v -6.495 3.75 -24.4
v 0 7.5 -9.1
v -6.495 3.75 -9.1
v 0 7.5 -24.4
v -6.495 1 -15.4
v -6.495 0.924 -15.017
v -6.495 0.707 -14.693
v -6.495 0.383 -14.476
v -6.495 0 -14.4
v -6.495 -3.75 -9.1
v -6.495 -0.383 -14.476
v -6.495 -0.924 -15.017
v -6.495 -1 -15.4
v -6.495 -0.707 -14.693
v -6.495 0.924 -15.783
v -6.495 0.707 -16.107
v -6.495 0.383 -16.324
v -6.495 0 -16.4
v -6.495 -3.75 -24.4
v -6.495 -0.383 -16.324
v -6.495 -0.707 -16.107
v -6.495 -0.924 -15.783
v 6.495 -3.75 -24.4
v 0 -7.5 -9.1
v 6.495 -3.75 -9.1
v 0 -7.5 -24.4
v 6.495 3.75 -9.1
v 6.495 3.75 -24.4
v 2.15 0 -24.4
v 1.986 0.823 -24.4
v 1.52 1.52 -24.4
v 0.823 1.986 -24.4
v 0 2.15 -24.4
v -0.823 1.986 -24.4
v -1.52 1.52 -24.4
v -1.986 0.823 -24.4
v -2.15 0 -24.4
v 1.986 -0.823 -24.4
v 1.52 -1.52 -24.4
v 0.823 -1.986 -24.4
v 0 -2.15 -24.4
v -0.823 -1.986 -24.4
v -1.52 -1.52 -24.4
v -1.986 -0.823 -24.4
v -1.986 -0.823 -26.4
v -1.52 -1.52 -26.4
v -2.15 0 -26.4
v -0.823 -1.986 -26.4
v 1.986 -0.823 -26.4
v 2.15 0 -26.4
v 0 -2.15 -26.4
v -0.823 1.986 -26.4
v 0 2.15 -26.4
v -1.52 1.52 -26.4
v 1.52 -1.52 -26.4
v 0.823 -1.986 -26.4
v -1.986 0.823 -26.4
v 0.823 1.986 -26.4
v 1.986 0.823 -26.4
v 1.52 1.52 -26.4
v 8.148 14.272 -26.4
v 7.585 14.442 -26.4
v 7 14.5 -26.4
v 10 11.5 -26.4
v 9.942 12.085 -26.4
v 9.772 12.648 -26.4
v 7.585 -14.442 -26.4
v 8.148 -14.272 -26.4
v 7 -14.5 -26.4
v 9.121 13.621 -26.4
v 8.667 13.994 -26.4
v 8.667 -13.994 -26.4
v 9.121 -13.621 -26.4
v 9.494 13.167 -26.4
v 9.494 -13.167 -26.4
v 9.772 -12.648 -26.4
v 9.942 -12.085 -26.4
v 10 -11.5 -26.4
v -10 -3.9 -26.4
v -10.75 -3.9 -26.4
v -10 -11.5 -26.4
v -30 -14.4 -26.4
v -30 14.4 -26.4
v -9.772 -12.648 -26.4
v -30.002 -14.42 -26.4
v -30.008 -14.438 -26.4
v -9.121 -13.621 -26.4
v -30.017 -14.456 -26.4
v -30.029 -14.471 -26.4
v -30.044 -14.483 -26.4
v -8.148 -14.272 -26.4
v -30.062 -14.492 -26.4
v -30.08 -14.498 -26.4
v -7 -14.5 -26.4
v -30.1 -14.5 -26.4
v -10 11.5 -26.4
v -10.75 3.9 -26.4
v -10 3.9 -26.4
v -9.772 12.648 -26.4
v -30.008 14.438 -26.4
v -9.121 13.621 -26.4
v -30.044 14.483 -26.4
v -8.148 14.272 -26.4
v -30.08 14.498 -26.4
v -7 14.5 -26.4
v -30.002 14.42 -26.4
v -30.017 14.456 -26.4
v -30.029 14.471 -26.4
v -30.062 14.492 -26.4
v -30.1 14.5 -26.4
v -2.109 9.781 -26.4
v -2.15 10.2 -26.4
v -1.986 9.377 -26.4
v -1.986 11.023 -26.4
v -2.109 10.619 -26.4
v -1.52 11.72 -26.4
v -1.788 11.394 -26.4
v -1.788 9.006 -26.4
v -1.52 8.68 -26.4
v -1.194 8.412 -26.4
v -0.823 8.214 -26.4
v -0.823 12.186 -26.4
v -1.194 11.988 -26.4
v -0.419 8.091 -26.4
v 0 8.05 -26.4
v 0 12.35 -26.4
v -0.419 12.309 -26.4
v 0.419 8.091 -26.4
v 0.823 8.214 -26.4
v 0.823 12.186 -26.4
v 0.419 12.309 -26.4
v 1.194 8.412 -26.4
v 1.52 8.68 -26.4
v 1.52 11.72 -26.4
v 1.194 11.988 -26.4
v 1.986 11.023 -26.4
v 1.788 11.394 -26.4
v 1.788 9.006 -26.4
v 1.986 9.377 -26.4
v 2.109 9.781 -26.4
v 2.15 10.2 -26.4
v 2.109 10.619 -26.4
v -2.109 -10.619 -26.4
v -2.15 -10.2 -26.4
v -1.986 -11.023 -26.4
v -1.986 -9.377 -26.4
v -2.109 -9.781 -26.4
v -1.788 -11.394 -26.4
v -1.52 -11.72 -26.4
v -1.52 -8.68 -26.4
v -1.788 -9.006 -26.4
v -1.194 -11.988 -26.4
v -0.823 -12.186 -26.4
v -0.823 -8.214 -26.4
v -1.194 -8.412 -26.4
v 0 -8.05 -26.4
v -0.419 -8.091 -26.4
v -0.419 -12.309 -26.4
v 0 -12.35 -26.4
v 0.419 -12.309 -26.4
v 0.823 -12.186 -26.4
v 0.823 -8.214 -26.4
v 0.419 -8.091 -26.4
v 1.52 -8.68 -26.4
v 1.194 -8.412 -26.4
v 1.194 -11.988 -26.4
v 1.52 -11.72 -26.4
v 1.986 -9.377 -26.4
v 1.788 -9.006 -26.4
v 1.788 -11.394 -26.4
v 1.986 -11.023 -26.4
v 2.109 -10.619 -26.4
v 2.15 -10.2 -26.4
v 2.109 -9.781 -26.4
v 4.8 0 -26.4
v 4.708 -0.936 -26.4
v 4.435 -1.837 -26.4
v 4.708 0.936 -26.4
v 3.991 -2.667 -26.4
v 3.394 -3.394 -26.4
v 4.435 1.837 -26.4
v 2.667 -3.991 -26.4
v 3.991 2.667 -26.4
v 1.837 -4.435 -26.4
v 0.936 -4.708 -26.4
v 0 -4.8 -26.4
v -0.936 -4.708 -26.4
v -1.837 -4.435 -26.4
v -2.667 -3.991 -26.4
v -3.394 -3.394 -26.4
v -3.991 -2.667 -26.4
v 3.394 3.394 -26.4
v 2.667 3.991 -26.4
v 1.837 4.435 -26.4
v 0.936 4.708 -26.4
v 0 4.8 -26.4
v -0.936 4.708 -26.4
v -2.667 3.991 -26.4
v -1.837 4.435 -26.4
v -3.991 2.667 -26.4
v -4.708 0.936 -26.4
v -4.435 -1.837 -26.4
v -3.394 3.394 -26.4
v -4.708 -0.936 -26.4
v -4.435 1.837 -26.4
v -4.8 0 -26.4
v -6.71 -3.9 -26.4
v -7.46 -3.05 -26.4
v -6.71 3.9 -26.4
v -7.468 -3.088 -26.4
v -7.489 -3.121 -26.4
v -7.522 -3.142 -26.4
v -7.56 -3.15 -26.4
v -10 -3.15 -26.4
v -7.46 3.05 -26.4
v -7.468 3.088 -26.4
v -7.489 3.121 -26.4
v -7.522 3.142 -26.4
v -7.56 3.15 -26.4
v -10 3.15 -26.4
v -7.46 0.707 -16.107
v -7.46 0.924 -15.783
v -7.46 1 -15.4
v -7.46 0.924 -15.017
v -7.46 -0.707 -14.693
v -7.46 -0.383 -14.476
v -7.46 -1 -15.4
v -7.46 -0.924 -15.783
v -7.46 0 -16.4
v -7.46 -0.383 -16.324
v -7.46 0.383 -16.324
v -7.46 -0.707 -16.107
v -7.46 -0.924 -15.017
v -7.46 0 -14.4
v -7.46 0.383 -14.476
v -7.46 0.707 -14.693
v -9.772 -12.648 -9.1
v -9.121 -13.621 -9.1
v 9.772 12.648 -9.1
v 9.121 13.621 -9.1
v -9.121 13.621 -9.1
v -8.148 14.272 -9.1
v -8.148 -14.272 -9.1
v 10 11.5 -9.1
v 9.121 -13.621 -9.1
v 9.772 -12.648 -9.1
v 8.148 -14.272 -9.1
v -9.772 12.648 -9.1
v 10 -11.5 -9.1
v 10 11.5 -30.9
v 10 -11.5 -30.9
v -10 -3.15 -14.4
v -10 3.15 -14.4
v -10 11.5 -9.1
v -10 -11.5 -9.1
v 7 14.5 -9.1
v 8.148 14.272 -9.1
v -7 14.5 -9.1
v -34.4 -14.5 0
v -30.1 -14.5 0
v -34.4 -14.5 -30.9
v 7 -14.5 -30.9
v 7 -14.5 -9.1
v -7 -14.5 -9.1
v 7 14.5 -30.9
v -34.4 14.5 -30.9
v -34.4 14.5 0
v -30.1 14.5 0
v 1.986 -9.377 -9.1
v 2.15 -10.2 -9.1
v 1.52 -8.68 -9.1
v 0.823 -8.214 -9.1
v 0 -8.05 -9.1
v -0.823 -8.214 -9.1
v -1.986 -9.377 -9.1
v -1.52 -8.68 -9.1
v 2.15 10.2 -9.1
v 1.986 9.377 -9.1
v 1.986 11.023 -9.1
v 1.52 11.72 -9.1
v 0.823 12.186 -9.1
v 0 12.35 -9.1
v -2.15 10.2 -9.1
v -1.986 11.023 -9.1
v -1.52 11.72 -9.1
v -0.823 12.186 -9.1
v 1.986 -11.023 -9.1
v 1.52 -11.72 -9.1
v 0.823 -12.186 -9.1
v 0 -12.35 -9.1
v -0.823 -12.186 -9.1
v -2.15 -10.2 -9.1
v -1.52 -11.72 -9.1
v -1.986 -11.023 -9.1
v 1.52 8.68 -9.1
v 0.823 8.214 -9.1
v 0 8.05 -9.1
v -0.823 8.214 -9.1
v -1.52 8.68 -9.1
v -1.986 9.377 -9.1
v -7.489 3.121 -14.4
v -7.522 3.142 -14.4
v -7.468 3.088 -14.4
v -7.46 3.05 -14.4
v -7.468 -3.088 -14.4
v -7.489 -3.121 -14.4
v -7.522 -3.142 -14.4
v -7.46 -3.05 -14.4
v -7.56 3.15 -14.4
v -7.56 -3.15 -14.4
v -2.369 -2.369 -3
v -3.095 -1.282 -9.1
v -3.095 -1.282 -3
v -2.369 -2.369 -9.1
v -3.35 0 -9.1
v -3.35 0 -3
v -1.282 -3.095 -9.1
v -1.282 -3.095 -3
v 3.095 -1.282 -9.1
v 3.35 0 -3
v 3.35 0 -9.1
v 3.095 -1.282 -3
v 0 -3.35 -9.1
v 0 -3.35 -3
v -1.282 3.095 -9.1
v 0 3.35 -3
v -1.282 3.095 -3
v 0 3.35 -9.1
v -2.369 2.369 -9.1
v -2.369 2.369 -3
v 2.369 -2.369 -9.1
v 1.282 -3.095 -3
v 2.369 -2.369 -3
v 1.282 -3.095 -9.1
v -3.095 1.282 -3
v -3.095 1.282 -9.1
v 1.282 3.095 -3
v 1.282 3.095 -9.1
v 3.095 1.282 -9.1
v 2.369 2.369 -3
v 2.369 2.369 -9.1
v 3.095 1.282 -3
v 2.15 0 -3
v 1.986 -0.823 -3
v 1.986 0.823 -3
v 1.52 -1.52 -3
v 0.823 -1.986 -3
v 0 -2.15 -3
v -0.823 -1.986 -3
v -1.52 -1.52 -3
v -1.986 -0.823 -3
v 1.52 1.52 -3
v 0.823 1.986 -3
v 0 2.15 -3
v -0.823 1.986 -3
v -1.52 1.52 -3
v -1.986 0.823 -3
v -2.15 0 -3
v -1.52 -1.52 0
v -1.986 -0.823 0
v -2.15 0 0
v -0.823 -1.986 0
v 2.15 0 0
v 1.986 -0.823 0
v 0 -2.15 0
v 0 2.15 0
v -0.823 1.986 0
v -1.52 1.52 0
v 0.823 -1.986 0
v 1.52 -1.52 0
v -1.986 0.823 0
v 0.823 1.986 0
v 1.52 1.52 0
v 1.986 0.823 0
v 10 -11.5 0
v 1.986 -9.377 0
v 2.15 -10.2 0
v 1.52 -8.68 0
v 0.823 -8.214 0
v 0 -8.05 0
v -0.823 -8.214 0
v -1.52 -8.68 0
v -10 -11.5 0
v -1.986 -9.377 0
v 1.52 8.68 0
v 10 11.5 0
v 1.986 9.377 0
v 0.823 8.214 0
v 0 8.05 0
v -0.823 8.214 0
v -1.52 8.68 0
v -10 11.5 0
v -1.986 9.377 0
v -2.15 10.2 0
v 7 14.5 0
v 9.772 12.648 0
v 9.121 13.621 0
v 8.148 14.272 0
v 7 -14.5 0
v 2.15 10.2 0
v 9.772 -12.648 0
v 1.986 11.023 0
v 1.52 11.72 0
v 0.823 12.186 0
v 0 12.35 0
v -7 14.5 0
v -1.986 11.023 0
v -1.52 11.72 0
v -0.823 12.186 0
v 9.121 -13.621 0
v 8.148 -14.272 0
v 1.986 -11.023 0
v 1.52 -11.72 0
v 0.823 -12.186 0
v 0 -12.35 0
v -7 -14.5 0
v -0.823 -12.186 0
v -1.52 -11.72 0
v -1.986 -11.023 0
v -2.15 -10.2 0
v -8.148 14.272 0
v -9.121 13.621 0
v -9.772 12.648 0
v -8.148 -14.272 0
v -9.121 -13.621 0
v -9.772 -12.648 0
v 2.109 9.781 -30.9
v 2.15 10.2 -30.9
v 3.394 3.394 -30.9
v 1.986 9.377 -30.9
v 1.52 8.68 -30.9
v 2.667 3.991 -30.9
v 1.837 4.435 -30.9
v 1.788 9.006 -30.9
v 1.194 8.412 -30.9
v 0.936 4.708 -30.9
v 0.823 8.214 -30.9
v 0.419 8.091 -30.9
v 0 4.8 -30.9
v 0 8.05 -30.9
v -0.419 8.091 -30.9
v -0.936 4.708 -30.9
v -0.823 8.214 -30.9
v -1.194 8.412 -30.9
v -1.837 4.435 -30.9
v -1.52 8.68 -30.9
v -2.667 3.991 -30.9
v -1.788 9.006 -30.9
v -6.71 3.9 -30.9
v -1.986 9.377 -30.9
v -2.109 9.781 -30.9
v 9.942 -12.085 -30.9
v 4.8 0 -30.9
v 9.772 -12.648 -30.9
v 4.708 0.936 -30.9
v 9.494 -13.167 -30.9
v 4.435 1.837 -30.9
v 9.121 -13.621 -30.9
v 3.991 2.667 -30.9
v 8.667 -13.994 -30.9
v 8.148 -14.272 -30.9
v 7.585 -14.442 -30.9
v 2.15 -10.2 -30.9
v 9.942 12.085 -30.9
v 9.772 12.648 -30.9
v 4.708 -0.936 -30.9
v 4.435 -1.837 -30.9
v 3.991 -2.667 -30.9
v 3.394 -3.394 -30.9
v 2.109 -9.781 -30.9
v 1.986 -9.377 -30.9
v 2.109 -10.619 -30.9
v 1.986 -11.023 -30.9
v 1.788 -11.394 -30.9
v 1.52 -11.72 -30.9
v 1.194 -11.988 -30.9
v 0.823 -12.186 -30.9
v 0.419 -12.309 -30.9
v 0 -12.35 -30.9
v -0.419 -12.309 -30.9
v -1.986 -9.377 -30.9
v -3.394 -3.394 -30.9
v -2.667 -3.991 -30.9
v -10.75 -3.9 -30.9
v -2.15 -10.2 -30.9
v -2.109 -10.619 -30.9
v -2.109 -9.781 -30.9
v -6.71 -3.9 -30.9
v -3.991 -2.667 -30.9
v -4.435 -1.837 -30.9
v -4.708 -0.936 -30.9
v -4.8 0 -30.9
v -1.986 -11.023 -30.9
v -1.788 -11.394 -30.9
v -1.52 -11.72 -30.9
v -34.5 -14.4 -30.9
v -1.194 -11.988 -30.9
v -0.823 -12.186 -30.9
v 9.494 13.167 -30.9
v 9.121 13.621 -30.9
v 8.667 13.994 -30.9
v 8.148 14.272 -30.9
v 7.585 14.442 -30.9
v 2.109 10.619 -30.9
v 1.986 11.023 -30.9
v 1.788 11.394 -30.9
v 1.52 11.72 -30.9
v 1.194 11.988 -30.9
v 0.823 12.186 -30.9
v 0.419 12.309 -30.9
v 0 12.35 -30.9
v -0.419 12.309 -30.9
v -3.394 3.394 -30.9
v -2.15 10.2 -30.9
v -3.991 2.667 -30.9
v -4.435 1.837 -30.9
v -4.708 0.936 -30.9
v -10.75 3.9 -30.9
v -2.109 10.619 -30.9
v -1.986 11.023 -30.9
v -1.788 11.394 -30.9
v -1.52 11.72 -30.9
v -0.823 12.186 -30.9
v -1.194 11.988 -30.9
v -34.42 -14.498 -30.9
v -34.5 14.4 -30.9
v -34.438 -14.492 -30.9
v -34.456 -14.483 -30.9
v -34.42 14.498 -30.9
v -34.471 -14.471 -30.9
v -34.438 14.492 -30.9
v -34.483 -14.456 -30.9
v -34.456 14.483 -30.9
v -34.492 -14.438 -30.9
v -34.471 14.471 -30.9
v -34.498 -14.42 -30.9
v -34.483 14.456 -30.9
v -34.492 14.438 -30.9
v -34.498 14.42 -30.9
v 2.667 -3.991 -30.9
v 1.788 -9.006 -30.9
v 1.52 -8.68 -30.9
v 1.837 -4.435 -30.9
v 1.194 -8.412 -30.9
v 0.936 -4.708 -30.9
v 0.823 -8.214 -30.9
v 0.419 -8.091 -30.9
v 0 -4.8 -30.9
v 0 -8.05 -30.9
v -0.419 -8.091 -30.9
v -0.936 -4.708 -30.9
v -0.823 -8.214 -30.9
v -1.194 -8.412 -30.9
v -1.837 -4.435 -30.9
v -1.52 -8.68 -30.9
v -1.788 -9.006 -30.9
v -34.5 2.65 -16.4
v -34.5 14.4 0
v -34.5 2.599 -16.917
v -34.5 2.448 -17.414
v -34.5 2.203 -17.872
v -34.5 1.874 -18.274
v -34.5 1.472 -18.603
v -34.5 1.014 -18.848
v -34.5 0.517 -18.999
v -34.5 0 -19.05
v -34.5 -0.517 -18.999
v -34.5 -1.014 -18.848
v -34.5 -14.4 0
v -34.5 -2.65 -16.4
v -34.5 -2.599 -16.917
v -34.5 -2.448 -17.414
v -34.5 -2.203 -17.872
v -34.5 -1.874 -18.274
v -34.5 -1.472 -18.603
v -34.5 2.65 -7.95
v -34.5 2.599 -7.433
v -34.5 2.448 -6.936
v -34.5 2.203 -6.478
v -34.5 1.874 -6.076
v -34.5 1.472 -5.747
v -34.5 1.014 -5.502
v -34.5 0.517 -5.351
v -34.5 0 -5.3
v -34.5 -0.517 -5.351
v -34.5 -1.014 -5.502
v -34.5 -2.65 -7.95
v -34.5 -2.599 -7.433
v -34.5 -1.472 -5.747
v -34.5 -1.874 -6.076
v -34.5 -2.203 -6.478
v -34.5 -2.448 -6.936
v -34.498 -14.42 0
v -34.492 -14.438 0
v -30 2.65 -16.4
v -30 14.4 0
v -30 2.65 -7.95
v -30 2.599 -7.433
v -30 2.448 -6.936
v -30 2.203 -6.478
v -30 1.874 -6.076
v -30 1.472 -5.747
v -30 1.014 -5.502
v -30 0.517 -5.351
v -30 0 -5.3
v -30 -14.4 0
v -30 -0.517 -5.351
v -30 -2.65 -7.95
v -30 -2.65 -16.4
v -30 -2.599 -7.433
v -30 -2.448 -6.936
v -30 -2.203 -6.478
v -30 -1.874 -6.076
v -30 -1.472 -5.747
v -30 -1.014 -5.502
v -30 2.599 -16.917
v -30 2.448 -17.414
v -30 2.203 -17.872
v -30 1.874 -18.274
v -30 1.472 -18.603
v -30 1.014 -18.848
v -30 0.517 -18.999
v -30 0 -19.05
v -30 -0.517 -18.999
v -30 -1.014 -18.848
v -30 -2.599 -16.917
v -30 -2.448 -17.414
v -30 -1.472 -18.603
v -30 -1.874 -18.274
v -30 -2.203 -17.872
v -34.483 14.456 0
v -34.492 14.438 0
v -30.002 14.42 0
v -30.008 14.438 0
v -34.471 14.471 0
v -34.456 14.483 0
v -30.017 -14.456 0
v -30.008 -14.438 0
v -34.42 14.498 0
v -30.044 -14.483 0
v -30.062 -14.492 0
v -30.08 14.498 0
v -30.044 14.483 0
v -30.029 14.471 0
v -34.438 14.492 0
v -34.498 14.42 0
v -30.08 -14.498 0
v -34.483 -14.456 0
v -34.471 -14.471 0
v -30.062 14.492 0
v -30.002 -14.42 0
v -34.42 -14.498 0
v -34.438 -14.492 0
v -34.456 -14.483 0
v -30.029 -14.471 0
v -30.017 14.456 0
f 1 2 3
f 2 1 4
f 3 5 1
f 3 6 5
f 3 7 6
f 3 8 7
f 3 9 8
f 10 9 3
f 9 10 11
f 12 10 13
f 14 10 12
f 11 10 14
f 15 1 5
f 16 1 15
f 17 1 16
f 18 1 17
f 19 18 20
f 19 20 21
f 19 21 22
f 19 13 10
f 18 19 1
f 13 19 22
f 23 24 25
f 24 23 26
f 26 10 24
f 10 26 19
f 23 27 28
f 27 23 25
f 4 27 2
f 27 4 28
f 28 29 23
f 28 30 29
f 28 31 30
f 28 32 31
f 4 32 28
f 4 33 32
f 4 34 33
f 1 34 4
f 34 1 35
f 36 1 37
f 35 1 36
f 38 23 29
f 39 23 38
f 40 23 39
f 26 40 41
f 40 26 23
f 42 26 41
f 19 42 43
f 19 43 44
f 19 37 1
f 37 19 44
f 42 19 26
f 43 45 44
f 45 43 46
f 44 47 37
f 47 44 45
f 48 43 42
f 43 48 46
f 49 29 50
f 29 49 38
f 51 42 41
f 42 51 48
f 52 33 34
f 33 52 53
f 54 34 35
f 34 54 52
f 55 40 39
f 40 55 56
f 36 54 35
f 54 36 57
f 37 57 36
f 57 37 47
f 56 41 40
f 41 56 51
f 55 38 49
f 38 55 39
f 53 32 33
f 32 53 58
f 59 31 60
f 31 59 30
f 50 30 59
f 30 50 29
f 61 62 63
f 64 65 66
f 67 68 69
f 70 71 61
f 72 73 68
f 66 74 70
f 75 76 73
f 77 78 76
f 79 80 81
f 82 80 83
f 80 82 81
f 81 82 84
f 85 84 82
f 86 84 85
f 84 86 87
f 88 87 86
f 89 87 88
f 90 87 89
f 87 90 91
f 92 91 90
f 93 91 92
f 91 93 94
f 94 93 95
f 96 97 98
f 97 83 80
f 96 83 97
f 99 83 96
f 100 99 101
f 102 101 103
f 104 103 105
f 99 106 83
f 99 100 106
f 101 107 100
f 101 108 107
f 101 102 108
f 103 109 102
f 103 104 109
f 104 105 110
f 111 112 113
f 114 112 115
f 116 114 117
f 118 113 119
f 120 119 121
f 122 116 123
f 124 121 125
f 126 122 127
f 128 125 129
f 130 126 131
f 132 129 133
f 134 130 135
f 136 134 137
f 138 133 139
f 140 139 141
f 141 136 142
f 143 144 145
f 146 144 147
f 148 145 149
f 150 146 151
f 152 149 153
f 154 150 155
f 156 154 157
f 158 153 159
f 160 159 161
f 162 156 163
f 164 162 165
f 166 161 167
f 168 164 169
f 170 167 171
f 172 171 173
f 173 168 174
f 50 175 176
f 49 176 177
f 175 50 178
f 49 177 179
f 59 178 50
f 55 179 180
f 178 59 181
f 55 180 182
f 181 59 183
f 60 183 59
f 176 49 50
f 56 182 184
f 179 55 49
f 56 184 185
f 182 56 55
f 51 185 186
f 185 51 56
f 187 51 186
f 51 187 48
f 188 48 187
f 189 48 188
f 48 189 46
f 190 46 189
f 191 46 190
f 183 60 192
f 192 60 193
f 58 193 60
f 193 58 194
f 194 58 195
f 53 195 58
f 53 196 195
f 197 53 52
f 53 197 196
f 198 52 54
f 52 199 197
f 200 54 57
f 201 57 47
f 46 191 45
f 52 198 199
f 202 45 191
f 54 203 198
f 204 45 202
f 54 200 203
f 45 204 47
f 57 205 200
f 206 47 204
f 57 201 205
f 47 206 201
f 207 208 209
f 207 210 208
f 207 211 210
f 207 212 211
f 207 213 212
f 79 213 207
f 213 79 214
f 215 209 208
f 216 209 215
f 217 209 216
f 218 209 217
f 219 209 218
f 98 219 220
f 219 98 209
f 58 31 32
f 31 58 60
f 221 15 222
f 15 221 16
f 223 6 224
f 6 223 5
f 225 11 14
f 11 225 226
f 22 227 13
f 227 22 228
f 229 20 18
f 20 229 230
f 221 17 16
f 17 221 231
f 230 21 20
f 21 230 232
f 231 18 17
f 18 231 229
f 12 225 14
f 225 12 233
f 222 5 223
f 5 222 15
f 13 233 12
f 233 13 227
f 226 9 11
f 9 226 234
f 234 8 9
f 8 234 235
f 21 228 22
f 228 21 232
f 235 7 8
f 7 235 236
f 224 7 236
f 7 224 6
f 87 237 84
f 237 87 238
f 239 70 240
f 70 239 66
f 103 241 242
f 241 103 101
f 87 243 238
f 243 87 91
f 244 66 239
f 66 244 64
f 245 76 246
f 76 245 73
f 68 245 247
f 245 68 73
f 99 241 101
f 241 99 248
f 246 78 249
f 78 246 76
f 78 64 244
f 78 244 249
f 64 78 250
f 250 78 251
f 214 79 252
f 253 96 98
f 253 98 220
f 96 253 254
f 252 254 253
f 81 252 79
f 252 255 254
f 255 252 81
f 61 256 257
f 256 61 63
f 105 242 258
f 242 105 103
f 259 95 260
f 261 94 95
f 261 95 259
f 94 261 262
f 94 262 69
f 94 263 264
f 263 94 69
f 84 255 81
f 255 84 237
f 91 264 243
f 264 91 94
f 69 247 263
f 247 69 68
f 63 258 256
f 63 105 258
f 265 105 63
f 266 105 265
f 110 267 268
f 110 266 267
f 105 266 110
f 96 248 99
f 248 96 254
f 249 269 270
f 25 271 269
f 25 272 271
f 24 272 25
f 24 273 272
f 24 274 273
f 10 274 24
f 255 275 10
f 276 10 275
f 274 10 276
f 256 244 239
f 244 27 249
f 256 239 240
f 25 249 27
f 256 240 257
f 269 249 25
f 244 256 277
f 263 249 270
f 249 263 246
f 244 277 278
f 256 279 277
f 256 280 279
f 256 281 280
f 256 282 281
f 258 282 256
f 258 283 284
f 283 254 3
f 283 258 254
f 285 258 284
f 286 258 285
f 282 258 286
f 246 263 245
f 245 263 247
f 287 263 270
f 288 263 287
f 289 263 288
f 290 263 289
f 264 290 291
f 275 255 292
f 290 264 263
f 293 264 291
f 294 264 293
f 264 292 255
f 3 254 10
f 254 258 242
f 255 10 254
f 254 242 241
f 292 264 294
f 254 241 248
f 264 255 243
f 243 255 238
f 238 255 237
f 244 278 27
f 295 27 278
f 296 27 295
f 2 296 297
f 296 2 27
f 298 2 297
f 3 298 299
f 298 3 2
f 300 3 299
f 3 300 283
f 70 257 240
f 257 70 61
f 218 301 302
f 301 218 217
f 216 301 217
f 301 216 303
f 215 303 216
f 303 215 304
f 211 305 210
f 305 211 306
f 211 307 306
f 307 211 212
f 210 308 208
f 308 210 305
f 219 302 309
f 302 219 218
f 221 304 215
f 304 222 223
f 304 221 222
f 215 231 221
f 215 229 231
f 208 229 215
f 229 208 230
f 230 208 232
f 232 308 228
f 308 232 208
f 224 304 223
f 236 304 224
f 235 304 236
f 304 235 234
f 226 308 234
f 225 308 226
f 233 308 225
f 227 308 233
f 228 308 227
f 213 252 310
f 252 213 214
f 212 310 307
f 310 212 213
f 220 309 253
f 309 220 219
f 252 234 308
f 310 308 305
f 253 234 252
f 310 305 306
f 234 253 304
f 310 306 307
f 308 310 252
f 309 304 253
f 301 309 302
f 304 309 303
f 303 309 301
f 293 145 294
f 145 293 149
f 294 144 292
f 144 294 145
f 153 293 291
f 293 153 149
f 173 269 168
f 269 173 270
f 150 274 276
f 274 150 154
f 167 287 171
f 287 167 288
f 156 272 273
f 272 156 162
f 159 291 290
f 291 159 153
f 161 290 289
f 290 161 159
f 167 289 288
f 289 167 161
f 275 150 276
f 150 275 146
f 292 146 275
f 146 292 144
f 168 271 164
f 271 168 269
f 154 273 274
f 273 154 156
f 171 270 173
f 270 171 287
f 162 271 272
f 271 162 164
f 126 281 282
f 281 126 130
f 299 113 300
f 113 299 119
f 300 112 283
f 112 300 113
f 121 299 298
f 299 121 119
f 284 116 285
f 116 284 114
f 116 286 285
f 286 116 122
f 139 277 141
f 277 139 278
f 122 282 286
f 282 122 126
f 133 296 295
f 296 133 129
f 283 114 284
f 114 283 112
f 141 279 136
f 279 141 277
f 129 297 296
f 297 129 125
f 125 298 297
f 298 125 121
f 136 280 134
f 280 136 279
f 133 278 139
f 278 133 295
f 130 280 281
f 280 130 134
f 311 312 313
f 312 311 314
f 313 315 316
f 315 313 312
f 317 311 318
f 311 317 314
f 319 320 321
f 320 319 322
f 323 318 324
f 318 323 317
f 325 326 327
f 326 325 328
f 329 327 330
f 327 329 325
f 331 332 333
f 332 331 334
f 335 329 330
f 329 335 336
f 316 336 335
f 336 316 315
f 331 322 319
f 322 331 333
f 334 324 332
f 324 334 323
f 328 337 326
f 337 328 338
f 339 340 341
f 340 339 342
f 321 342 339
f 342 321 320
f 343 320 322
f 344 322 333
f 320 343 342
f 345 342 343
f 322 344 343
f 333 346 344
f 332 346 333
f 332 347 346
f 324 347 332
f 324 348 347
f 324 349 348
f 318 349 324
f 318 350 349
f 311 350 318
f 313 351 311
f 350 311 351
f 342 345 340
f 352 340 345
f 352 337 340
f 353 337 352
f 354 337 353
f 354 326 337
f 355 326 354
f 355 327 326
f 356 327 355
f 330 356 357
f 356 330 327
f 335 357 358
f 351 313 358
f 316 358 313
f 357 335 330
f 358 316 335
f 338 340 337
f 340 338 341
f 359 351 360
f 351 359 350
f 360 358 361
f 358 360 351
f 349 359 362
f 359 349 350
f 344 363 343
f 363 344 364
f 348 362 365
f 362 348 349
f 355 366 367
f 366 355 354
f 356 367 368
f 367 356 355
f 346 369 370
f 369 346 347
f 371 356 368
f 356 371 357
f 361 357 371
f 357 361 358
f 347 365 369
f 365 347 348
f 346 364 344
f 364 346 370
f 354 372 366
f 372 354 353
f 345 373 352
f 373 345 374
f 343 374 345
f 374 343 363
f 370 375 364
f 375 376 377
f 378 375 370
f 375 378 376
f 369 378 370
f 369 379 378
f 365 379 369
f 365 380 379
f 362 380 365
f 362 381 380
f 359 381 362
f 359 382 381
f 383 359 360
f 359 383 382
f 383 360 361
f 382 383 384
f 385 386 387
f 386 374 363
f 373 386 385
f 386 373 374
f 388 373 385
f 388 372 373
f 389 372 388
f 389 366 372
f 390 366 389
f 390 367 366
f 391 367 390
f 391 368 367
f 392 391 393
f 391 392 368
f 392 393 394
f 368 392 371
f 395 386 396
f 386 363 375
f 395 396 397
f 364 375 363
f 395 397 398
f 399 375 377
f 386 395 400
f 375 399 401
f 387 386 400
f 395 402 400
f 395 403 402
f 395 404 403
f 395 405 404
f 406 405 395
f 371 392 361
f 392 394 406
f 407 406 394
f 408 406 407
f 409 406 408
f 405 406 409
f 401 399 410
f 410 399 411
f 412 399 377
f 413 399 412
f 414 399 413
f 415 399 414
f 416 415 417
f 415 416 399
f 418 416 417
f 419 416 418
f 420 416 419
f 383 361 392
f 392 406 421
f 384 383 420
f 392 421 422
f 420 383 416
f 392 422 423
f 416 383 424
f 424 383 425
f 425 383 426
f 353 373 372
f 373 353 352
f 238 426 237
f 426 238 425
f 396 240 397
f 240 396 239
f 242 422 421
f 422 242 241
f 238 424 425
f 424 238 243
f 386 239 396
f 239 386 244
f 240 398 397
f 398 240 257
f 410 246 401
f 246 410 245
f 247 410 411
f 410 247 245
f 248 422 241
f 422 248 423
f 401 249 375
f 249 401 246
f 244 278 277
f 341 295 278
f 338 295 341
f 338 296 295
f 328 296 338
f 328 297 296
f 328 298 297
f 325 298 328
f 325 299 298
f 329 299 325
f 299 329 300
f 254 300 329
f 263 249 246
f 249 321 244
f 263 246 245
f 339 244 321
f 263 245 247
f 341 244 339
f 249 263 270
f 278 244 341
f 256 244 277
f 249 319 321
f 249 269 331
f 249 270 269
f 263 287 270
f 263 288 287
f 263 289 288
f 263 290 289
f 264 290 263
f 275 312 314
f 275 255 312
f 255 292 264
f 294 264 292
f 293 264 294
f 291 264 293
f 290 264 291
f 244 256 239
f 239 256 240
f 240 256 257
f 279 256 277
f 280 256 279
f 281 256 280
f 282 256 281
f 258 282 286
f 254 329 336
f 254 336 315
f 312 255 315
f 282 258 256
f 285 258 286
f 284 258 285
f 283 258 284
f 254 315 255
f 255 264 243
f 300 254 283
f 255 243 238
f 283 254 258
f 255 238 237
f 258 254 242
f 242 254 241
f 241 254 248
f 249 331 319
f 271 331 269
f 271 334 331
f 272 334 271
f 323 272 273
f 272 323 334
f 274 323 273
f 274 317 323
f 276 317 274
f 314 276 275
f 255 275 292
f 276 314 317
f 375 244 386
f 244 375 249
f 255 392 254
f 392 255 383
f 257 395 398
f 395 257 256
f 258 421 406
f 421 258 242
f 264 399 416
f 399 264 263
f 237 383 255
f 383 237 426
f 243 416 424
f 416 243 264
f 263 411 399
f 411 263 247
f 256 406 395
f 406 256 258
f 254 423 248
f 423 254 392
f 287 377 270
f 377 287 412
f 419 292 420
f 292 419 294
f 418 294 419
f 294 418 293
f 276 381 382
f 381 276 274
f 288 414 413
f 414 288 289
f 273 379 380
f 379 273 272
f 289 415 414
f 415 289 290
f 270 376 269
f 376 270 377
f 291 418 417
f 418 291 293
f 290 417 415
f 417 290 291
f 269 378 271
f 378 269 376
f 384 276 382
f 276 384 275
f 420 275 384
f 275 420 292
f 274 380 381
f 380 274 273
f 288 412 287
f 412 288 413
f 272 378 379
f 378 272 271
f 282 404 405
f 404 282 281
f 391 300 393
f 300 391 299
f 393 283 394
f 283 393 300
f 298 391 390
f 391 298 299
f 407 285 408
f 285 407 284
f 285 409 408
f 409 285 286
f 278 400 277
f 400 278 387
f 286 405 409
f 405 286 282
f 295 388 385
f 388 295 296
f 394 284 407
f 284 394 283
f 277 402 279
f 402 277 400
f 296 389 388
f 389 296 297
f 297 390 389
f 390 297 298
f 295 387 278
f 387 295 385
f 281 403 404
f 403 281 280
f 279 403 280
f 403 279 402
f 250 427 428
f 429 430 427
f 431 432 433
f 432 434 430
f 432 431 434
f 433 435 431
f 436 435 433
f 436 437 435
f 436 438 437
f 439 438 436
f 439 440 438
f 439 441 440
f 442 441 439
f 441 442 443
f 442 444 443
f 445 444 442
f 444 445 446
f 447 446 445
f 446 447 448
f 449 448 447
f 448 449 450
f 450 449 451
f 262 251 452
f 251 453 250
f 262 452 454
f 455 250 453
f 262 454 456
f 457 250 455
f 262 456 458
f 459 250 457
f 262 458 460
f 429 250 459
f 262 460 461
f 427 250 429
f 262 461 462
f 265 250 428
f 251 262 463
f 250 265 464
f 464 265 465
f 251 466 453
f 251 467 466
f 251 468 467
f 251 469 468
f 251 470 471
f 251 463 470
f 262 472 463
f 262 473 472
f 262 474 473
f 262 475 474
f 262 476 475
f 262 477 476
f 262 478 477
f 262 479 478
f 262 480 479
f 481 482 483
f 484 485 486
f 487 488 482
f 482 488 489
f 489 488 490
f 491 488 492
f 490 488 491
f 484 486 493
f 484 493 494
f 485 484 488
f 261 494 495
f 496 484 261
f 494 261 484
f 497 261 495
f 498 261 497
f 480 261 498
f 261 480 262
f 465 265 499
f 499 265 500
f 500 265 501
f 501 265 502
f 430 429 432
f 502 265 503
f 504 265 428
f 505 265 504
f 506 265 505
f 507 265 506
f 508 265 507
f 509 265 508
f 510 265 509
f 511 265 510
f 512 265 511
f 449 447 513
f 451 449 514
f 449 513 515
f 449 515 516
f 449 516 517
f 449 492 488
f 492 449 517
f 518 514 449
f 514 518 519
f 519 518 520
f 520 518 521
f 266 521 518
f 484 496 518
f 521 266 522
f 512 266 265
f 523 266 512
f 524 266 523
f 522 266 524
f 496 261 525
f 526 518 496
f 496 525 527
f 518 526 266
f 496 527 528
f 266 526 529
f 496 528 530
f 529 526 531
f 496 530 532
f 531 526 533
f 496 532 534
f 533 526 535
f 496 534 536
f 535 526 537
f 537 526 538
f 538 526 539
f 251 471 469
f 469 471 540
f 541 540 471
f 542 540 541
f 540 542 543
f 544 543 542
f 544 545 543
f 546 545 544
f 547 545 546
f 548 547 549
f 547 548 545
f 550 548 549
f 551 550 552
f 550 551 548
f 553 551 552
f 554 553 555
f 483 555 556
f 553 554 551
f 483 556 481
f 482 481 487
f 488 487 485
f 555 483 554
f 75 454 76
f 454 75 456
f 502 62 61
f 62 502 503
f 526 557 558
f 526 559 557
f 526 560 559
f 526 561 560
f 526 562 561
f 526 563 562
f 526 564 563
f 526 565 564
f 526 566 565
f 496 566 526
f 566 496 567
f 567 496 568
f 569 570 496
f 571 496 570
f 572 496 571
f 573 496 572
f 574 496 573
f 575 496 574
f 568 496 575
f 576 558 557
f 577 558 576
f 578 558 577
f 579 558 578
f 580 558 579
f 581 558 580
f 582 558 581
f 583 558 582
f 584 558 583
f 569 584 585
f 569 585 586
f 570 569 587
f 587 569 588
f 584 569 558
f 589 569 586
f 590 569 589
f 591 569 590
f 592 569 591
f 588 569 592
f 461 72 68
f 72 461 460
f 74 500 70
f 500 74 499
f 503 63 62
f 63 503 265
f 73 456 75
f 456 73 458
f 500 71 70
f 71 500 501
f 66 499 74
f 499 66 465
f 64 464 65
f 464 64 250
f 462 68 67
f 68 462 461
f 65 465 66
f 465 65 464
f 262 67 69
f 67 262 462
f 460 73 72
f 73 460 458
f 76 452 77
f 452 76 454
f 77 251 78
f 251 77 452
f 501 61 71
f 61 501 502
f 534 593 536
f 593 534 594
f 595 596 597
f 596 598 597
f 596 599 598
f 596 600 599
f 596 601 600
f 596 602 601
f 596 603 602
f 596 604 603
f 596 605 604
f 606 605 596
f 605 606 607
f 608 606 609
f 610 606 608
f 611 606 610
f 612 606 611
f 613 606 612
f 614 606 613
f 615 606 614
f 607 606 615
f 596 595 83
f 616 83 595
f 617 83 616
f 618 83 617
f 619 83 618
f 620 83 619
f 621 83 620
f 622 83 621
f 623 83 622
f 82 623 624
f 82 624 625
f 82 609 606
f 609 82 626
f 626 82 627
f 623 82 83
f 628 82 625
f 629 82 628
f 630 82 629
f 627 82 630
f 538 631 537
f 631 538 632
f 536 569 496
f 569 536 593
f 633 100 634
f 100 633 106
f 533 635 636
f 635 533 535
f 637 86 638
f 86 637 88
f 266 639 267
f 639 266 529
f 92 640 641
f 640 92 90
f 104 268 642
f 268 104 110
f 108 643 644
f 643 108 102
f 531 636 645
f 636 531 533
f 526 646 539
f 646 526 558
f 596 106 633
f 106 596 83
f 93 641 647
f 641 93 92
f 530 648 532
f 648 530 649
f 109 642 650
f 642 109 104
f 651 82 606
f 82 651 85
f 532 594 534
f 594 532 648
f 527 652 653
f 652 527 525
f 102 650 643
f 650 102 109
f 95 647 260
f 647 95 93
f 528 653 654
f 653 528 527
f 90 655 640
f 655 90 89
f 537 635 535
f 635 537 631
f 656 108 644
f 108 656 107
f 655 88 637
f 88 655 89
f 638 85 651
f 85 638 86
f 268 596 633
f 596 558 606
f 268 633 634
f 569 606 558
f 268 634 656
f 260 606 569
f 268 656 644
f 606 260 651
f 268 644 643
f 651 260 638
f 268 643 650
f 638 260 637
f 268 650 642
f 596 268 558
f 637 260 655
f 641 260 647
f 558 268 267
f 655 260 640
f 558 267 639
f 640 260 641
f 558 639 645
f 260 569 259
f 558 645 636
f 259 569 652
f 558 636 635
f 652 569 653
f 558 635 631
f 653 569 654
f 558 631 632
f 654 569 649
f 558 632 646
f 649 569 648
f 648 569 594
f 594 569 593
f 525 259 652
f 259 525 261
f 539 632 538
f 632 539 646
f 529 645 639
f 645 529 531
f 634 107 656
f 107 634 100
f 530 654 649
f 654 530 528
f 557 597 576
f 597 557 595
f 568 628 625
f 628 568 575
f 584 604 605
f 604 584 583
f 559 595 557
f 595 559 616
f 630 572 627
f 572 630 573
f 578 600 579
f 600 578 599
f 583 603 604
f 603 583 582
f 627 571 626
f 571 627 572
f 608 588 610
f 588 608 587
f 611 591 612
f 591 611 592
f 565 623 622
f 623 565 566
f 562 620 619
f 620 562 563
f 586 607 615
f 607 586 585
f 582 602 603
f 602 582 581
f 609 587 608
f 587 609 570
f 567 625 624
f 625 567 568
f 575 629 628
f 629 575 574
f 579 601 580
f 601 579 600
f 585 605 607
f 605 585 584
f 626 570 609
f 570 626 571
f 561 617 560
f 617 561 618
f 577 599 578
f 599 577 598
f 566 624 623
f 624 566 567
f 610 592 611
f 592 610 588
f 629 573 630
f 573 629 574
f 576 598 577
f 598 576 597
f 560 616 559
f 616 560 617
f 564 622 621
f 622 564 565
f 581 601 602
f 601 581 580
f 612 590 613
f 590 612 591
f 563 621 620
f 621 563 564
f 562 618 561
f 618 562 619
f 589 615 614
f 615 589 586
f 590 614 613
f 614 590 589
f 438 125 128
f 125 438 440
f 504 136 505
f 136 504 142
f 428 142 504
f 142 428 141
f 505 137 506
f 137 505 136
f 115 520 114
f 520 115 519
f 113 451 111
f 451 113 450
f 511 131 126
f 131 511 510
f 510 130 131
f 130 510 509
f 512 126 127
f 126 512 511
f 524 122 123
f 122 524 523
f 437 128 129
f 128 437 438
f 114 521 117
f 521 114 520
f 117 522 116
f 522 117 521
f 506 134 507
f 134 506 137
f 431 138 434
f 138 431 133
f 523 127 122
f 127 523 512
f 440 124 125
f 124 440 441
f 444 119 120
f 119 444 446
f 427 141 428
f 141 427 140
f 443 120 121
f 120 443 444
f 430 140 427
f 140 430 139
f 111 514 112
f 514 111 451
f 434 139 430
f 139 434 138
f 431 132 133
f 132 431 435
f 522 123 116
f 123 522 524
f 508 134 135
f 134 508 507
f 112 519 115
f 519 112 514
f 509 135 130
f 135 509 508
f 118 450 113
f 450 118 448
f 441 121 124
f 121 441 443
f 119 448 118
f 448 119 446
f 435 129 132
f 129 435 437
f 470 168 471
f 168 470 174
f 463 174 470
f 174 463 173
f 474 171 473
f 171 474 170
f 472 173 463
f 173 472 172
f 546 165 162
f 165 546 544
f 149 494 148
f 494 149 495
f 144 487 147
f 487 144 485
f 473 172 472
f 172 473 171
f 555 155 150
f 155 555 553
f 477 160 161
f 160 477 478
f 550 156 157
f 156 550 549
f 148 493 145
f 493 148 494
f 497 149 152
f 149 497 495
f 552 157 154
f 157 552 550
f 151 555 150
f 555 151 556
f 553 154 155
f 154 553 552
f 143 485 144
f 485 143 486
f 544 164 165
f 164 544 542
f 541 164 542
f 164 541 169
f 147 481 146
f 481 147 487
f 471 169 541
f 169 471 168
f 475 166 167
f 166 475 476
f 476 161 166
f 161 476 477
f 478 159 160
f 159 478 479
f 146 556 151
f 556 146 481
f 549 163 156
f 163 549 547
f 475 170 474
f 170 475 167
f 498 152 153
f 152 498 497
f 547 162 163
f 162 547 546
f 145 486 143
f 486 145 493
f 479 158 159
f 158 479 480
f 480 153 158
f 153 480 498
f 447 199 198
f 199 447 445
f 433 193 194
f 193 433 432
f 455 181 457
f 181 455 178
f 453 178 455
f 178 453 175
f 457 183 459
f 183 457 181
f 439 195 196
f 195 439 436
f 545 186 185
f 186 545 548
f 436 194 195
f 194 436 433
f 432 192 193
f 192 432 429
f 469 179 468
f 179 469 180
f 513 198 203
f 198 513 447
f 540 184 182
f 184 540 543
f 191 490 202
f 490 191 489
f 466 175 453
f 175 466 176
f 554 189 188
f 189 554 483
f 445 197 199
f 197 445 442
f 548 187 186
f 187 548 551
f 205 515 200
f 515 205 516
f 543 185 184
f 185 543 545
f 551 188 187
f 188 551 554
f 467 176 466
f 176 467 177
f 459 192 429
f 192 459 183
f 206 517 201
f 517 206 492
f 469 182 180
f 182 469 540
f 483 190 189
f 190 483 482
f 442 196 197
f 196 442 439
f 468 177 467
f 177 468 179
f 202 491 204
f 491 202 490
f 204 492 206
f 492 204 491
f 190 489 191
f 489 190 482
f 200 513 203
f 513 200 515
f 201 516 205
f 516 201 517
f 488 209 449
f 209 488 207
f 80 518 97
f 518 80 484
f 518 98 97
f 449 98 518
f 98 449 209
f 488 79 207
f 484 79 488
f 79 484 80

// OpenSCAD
// file: parameter.scad
//-------Parameter GHarp----------------------------------------------------

strScale=650;
strDia=3;
strPosX=20;
strPosY=-20;
slotXY=20;
nStr=3;

nema17_height=40;
nema17_width=42;
nema17_shftDia=5;
nema17_shftLen=28;
nema17_holeDist=31;
Nema17_gearDia=23;

tuner_bDi=7.8;
tuner_bDo=22.2;
tuner_bZ=10;
tuner_rThick=5;
//tuner_tDia=strPosX*2; (big)
tuner_tDia=strPosX*2-10;
tuner_leverZ=10;
tuner_zPos=225;
tuner_strDia=strDia[0];
tuner_leverY=35;

//----------Kickup----------------------------------------------------

kickup_baseX=17;
kickup_baseY=13;
kickup_zAdjDia=3.3;
kickup_zAdjL=10;
kickup_zAdjDist=10.5;
kickup_zAdjOff=4;
//------------------------------------------------------------------------

slide_cpDst=1.5;
slide_rackPosX=(55-12.5);

m3Dia=3.3;
m3NutD=6.6;
m4Dia=4.3;
m4NutD=8.3;
m4NutZ=5;
m5Dia=5.3;
m5HeadD=9.6;

edgeR=3;

gearXPos=57;
gearYPos=0;
gearZPos=360;

rackScrD=20;
rack_X=13;
rack_Y=15.5;
rack_extOffX=0;

bearGearD=25;
mntGrD=20.5; //mount gear distance

mnt_pcbA_X=157;
mnt_pcbA_Y=101;

//---------End Parameter GHarp-----------------------------------------------


////-------Parameter Bass----------------------------------------------------

//strScale=650;
//strDia=4;
//strPosX=20;
//strPosY=-20;
//slotXY=20;
//
//nema17_height=40;
//nema17_width=42;
//nema17_shftDia=5;
//nema17_shftLen=28;
//nema17_holeDist=31;
//Nema17_gearDia=23;
//
//tuner_bDi=7.8;
//tuner_bDo=22.2;
//tuner_bZ=10;
//tuner_rThick=5;
////tuner_tDia=strPosX*2; (big)
//tuner_tDia=strPosX*2-10;
//tuner_leverZ=10;
//tuner_zPos=225;
//tuner_strDia=strDia[0];
//tuner_leverY=35;
//
////----------Kickup----------------------------------------------------
//
//
//kickup_baseX=22;
//kickup_baseY=15;
//kickup_zAdjDia=3.3;
//kickup_zAdjL=10;
//kickup_zAdjDist=13;
//kickup_zAdjOff=4;
//
//
//slide_cpDst=1.5;
//slide_rackPosX=(55-12.5);
//
//m3NutD=6.6;
//m4Dia=4.3;
//m4NutD=8.3;
//m5Dia=5.3;
//
//edgeR=3;
//
//gearXPos=57;
//gearYPos=0;
//gearZPos=360;
//
//rackScrD=20;
//rack_X=13;
//rack_Y=15.5;
//rack_extOffX=0;
//
//bearGearD=25;
//mntGrD=20.5; //mount gear distance
////
//////---------End Bass-----------------------------------------------
// main file
include <parameter.scad>
strSpanB=10;
bodySlotX=100;

kickup(2);

module kickup(orient){
$fn=32;
strings=2;
spacing=strSpanB;//52;
echo (spacing);
diameter=15;
wall=2;
coilZ=15;
bottomZ=2;
t=0.3;
ySpacing=12;

bX = slotXY;
bY=ySpacing+diameter+wall*1;
bZ=coilZ+bottomZ+t;

tX = bX;
tY=bY;
hub=3;
magZ=3.1;
tbottomZ=3;
tZ=hub+magZ+tbottomZ;
tDia=6.7;//6.5;
screwTdia=4.3;

conMntX=2.54;
conMntY=6.3;
conMntZ=12;
conWt=1.5;

screwMdia=4.3;
screwAdia=4.3;

mntTh=4.5;
mX=bX+slotXY+mntTh;


module mnt(){
difference(){
    union(){
        translate([-mX/2+bX/2,0,-mntTh])rcube([mX,bY,mntTh],3);
        translate([-mX+bX/2+mntTh/2,0,-mntTh])rcube([mntTh,bY,bZ+mntTh+tZ],0.1);
    }
    hull(){
    translate([-bX/2-slotXY,0,slotXY/2])rotate([0,-90,0])cylinder(d=m5Dia,h=bZ,center=true);
    translate([-bX/2-slotXY,0,(bZ+tZ)-m5Dia*1.5])rotate([0,-90,0])cylinder(d=m5Dia,h=bZ,center=true);
    }
    
    translate([0,bY/2-screwMdia,-mntTh-1])cylinder(d=screwMdia,h=bZ);
    translate([0,-bY/2+screwMdia,-mntTh-1])cylinder(d=screwMdia,h=bZ);
    
    translate([0,0,-mntTh-1])cylinder(d=screwMdia*2+1,h=bZ);
    translate([-bX/2+conMntX/2,0,0])cube([conMntX+conWt,conMntY+conWt,conMntZ],center=true);
}
}

module base(){
$fn=16;
cableDia=2;
difference(){
    union(){
        translate([0,0,0])rcube([bX,bY,bZ],3);
        //translate([bX/2+(conMntX+conWt)/2,0,0])rcube([conMntX+conWt,conMntY+conWt*2,conMntZ],0.1);  
    }

translate([bX/2-(conMntX)/2+1,0,0])rcube([conMntX+2,conMntY,conMntZ],0.1); 
translate([0,0,0]){
translate([0,0,bottomZ])rotate([0,0,30])cylinder(d=diameter,h=100,$fn=6);
translate([0,0,0])cylinder(d=screwAdia,h=100);
translate([0,0,conMntZ-cableDia/2])rotate([0,90,0])cylinder(d=cableDia,h=100);
}
translate([0,bY/2-screwMdia,0])cylinder(d=screwMdia,h=bZ);
translate([0,-bY/2+screwMdia,0])cylinder(d=screwMdia,h=bZ);
}
}

module top(){
$fn=16;
difference(){
translate([0,0,0])rcube([tX,tY,tZ],3);

translate([0,0,0]){

translate([0,0,-tbottomZ])cylinder(d=tDia,h=tZ);
cylinder(d=screwTdia,h=tZ);
}
translate([0,bY/2-screwMdia,0])cylinder(d=screwMdia,h=tZ);
translate([0,-bY/2+screwMdia,0])cylinder(d=screwMdia,h=tZ);
}
}


module rcube(size,radius){
linear_extrude(height=size[2])
if(radius>0){
hull()
{
    // place 4 circles in the corners, with the given radius
    translate([(-size[0]/2)+(radius), (-size[1]/2)+(radius), 0])
    circle(r=radius);

    translate([(size[0]/2)-(radius), (-size[1]/2)+(radius), 0])
    circle(r=radius);

    translate([(-size[0]/2)+(radius), (size[1]/2)-(radius), 0])
    circle(r=radius);

    translate([(size[0]/2)-(radius), (size[1]/2)-(radius), 0])
    circle(r=radius);
}
}
if(radius==0){
translate([0,0,size[2]/2])cube(size,center=true);
}
}




module coil(){
$fn=32;
magholedia=4;
wallthick=0.5;
loweridlerZ=1.8;
upperidlerZ=1.8;
rampBZ=0.2;
rampTZ=0.2;
coildia=14;
rampdia=coildia;
threaddepth=5;
roofZ=loweridlerZ;

difference(){
union(){
cylinder(d=magholedia+wallthick*2,h=coilZ);
translate([0,0,loweridlerZ])cylinder(d1=rampdia,d2=magholedia+wallthick*2,h=rampBZ,$fn=6);
translate([0,0,coilZ-upperidlerZ-rampTZ])cylinder(d2=rampdia/100*100,d1=magholedia+wallthick*2,h=rampTZ,$fn=6);
translate([0,0,coilZ-upperidlerZ])cylinder(d=coildia/100*100,h=upperidlerZ,,$fn=6);
//Ccube([coildia,coildia,upperidlerZ],[0,0,1]);
translate([0,0,0]){
//Ccube([coildia,coildia,loweridlerZ],[0,0,1]);
cylinder(d=coildia,h=loweridlerZ,$fn=6);

}
}

translate([0,0,-roofZ])cylinder(d=magholedia,h=coilZ);
//cylinder(d=coilthreaddia,h=coilZ+1);
}}

if(orient==1){
base();
translate([0,tY+28,tZ])rotate([180,0,0])top();
translate([0,tY+0,0])rotate([30,0,0])rotate([0,90,0])coil();
}
if(orient==2){
translate([0,0,-bZ-tZ]){
rotate([0,0,180]){
base();
translate([0,0,bZ])rotate([0,0,0])top();
}
mnt();
//translate([0,tY+0,0])rotate([30,0,0])rotate([0,90,0])coil();
}
}

if(orient==3){
translate([0,0,0]){
mnt();
//translate([0,tY+0,0])rotate([30,0,0])rotate([0,90,0])coil();
}
}
}
